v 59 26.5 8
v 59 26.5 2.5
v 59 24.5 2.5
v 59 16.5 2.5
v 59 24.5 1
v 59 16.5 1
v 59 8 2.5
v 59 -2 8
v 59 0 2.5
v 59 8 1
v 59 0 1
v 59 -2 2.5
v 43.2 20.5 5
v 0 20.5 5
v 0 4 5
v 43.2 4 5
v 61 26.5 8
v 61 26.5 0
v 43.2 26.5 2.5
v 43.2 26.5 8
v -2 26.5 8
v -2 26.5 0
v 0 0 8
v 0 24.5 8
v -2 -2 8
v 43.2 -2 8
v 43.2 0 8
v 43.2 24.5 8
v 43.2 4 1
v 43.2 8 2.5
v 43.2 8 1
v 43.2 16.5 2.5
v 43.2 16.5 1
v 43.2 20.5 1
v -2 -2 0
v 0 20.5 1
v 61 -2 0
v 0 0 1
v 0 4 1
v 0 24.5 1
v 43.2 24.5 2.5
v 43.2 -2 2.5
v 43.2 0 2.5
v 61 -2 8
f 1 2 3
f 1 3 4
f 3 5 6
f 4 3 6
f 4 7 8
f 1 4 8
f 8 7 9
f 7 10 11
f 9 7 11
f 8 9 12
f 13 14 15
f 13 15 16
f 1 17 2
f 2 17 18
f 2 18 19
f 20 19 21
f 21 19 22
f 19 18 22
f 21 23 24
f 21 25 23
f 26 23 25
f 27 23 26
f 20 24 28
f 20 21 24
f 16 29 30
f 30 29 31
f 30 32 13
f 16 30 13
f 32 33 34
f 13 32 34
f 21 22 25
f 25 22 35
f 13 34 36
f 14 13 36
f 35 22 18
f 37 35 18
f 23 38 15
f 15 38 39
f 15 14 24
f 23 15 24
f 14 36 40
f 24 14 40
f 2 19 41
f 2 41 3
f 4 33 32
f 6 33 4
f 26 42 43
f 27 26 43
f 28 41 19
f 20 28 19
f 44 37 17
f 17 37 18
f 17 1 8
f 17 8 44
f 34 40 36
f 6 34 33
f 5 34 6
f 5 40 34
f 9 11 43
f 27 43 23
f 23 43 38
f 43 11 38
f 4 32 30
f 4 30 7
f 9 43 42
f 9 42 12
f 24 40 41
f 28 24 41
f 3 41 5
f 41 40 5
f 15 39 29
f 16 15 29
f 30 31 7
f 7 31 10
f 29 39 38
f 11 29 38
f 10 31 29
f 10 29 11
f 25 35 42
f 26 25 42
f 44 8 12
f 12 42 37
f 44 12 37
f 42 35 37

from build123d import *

# Parameters (mm, degrees)
F0_W     = 43.2
F0_H     = 4
F1_DEPTH = 1
F0_W_2   = 15.8
F0_H_2   = 2
F0_H_3   = 8.5
F2_DEPTH = 2.5
F3_DEPTH = 5
F4_DEPTH = 8


with BuildPart() as f1:
    # F0 (on Top) → F1 (new body)
    with BuildSketch(Plane.XY):
        Polygon((59, 16.5), (59, 24.5), (43.2, 24.5), (43.2, 20.5), (43.2, 16.5), align=None)
        with Locations((21.6, 22.5)):
            Rectangle(F0_W, F0_H)
    extrude(amount=F1_DEPTH)



with BuildPart() as f1b:
    # F0 (on Top) → F1, piece 2 (new body)
    with BuildSketch(Plane.XY):
        Polygon((59, 0), (59, 8), (43.2, 8), (43.2, 4), (43.2, 0), align=None)
        with Locations((21.6, 2)):
            Rectangle(F0_W, F0_H)
    extrude(amount=F1_DEPTH)


with BuildPart() as f1_1:
    add(f1.part)

    add(f1b.part)  # F2 merges F1b
    # F0 (on Top) → F2 (join)
    with BuildSketch(Plane.XY):
        with Locations((51.1, 25.5)):
            Rectangle(F0_W_2, F0_H_2)
        with Locations((51.1, 12.25)):
            Rectangle(F0_W_2, F0_H_3)
        with Locations((51.1, -1)):
            Rectangle(F0_W_2, F0_H_2)
    extrude(amount=F2_DEPTH)

    # F0 (on Top) → F3 (join)
    with BuildSketch(Plane.XY):
        Polygon((43.2, 8), (43.2, 16.5), (43.2, 20.5), (0, 20.5), (0, 4), (43.2, 4), align=None)
    extrude(amount=F3_DEPTH)

    # F0 (on Top) → F4 (join)
    with BuildSketch(Plane.XY):
        Polygon((43.2, 24.5), (43.2, 26.5), (-2, 26.5), (-2, -2), (43.2, -2), (43.2, 0), (0, 0), (0, 4), (0, 20.5), (0, 24.5), align=None)
        Polygon((61, 26.5), (59, 26.5), (59, 24.5), (59, 16.5), (59, 8), (59, 0), (59, -2), (61, -2), align=None)
    extrude(amount=F4_DEPTH)


solid = f1_1.part
